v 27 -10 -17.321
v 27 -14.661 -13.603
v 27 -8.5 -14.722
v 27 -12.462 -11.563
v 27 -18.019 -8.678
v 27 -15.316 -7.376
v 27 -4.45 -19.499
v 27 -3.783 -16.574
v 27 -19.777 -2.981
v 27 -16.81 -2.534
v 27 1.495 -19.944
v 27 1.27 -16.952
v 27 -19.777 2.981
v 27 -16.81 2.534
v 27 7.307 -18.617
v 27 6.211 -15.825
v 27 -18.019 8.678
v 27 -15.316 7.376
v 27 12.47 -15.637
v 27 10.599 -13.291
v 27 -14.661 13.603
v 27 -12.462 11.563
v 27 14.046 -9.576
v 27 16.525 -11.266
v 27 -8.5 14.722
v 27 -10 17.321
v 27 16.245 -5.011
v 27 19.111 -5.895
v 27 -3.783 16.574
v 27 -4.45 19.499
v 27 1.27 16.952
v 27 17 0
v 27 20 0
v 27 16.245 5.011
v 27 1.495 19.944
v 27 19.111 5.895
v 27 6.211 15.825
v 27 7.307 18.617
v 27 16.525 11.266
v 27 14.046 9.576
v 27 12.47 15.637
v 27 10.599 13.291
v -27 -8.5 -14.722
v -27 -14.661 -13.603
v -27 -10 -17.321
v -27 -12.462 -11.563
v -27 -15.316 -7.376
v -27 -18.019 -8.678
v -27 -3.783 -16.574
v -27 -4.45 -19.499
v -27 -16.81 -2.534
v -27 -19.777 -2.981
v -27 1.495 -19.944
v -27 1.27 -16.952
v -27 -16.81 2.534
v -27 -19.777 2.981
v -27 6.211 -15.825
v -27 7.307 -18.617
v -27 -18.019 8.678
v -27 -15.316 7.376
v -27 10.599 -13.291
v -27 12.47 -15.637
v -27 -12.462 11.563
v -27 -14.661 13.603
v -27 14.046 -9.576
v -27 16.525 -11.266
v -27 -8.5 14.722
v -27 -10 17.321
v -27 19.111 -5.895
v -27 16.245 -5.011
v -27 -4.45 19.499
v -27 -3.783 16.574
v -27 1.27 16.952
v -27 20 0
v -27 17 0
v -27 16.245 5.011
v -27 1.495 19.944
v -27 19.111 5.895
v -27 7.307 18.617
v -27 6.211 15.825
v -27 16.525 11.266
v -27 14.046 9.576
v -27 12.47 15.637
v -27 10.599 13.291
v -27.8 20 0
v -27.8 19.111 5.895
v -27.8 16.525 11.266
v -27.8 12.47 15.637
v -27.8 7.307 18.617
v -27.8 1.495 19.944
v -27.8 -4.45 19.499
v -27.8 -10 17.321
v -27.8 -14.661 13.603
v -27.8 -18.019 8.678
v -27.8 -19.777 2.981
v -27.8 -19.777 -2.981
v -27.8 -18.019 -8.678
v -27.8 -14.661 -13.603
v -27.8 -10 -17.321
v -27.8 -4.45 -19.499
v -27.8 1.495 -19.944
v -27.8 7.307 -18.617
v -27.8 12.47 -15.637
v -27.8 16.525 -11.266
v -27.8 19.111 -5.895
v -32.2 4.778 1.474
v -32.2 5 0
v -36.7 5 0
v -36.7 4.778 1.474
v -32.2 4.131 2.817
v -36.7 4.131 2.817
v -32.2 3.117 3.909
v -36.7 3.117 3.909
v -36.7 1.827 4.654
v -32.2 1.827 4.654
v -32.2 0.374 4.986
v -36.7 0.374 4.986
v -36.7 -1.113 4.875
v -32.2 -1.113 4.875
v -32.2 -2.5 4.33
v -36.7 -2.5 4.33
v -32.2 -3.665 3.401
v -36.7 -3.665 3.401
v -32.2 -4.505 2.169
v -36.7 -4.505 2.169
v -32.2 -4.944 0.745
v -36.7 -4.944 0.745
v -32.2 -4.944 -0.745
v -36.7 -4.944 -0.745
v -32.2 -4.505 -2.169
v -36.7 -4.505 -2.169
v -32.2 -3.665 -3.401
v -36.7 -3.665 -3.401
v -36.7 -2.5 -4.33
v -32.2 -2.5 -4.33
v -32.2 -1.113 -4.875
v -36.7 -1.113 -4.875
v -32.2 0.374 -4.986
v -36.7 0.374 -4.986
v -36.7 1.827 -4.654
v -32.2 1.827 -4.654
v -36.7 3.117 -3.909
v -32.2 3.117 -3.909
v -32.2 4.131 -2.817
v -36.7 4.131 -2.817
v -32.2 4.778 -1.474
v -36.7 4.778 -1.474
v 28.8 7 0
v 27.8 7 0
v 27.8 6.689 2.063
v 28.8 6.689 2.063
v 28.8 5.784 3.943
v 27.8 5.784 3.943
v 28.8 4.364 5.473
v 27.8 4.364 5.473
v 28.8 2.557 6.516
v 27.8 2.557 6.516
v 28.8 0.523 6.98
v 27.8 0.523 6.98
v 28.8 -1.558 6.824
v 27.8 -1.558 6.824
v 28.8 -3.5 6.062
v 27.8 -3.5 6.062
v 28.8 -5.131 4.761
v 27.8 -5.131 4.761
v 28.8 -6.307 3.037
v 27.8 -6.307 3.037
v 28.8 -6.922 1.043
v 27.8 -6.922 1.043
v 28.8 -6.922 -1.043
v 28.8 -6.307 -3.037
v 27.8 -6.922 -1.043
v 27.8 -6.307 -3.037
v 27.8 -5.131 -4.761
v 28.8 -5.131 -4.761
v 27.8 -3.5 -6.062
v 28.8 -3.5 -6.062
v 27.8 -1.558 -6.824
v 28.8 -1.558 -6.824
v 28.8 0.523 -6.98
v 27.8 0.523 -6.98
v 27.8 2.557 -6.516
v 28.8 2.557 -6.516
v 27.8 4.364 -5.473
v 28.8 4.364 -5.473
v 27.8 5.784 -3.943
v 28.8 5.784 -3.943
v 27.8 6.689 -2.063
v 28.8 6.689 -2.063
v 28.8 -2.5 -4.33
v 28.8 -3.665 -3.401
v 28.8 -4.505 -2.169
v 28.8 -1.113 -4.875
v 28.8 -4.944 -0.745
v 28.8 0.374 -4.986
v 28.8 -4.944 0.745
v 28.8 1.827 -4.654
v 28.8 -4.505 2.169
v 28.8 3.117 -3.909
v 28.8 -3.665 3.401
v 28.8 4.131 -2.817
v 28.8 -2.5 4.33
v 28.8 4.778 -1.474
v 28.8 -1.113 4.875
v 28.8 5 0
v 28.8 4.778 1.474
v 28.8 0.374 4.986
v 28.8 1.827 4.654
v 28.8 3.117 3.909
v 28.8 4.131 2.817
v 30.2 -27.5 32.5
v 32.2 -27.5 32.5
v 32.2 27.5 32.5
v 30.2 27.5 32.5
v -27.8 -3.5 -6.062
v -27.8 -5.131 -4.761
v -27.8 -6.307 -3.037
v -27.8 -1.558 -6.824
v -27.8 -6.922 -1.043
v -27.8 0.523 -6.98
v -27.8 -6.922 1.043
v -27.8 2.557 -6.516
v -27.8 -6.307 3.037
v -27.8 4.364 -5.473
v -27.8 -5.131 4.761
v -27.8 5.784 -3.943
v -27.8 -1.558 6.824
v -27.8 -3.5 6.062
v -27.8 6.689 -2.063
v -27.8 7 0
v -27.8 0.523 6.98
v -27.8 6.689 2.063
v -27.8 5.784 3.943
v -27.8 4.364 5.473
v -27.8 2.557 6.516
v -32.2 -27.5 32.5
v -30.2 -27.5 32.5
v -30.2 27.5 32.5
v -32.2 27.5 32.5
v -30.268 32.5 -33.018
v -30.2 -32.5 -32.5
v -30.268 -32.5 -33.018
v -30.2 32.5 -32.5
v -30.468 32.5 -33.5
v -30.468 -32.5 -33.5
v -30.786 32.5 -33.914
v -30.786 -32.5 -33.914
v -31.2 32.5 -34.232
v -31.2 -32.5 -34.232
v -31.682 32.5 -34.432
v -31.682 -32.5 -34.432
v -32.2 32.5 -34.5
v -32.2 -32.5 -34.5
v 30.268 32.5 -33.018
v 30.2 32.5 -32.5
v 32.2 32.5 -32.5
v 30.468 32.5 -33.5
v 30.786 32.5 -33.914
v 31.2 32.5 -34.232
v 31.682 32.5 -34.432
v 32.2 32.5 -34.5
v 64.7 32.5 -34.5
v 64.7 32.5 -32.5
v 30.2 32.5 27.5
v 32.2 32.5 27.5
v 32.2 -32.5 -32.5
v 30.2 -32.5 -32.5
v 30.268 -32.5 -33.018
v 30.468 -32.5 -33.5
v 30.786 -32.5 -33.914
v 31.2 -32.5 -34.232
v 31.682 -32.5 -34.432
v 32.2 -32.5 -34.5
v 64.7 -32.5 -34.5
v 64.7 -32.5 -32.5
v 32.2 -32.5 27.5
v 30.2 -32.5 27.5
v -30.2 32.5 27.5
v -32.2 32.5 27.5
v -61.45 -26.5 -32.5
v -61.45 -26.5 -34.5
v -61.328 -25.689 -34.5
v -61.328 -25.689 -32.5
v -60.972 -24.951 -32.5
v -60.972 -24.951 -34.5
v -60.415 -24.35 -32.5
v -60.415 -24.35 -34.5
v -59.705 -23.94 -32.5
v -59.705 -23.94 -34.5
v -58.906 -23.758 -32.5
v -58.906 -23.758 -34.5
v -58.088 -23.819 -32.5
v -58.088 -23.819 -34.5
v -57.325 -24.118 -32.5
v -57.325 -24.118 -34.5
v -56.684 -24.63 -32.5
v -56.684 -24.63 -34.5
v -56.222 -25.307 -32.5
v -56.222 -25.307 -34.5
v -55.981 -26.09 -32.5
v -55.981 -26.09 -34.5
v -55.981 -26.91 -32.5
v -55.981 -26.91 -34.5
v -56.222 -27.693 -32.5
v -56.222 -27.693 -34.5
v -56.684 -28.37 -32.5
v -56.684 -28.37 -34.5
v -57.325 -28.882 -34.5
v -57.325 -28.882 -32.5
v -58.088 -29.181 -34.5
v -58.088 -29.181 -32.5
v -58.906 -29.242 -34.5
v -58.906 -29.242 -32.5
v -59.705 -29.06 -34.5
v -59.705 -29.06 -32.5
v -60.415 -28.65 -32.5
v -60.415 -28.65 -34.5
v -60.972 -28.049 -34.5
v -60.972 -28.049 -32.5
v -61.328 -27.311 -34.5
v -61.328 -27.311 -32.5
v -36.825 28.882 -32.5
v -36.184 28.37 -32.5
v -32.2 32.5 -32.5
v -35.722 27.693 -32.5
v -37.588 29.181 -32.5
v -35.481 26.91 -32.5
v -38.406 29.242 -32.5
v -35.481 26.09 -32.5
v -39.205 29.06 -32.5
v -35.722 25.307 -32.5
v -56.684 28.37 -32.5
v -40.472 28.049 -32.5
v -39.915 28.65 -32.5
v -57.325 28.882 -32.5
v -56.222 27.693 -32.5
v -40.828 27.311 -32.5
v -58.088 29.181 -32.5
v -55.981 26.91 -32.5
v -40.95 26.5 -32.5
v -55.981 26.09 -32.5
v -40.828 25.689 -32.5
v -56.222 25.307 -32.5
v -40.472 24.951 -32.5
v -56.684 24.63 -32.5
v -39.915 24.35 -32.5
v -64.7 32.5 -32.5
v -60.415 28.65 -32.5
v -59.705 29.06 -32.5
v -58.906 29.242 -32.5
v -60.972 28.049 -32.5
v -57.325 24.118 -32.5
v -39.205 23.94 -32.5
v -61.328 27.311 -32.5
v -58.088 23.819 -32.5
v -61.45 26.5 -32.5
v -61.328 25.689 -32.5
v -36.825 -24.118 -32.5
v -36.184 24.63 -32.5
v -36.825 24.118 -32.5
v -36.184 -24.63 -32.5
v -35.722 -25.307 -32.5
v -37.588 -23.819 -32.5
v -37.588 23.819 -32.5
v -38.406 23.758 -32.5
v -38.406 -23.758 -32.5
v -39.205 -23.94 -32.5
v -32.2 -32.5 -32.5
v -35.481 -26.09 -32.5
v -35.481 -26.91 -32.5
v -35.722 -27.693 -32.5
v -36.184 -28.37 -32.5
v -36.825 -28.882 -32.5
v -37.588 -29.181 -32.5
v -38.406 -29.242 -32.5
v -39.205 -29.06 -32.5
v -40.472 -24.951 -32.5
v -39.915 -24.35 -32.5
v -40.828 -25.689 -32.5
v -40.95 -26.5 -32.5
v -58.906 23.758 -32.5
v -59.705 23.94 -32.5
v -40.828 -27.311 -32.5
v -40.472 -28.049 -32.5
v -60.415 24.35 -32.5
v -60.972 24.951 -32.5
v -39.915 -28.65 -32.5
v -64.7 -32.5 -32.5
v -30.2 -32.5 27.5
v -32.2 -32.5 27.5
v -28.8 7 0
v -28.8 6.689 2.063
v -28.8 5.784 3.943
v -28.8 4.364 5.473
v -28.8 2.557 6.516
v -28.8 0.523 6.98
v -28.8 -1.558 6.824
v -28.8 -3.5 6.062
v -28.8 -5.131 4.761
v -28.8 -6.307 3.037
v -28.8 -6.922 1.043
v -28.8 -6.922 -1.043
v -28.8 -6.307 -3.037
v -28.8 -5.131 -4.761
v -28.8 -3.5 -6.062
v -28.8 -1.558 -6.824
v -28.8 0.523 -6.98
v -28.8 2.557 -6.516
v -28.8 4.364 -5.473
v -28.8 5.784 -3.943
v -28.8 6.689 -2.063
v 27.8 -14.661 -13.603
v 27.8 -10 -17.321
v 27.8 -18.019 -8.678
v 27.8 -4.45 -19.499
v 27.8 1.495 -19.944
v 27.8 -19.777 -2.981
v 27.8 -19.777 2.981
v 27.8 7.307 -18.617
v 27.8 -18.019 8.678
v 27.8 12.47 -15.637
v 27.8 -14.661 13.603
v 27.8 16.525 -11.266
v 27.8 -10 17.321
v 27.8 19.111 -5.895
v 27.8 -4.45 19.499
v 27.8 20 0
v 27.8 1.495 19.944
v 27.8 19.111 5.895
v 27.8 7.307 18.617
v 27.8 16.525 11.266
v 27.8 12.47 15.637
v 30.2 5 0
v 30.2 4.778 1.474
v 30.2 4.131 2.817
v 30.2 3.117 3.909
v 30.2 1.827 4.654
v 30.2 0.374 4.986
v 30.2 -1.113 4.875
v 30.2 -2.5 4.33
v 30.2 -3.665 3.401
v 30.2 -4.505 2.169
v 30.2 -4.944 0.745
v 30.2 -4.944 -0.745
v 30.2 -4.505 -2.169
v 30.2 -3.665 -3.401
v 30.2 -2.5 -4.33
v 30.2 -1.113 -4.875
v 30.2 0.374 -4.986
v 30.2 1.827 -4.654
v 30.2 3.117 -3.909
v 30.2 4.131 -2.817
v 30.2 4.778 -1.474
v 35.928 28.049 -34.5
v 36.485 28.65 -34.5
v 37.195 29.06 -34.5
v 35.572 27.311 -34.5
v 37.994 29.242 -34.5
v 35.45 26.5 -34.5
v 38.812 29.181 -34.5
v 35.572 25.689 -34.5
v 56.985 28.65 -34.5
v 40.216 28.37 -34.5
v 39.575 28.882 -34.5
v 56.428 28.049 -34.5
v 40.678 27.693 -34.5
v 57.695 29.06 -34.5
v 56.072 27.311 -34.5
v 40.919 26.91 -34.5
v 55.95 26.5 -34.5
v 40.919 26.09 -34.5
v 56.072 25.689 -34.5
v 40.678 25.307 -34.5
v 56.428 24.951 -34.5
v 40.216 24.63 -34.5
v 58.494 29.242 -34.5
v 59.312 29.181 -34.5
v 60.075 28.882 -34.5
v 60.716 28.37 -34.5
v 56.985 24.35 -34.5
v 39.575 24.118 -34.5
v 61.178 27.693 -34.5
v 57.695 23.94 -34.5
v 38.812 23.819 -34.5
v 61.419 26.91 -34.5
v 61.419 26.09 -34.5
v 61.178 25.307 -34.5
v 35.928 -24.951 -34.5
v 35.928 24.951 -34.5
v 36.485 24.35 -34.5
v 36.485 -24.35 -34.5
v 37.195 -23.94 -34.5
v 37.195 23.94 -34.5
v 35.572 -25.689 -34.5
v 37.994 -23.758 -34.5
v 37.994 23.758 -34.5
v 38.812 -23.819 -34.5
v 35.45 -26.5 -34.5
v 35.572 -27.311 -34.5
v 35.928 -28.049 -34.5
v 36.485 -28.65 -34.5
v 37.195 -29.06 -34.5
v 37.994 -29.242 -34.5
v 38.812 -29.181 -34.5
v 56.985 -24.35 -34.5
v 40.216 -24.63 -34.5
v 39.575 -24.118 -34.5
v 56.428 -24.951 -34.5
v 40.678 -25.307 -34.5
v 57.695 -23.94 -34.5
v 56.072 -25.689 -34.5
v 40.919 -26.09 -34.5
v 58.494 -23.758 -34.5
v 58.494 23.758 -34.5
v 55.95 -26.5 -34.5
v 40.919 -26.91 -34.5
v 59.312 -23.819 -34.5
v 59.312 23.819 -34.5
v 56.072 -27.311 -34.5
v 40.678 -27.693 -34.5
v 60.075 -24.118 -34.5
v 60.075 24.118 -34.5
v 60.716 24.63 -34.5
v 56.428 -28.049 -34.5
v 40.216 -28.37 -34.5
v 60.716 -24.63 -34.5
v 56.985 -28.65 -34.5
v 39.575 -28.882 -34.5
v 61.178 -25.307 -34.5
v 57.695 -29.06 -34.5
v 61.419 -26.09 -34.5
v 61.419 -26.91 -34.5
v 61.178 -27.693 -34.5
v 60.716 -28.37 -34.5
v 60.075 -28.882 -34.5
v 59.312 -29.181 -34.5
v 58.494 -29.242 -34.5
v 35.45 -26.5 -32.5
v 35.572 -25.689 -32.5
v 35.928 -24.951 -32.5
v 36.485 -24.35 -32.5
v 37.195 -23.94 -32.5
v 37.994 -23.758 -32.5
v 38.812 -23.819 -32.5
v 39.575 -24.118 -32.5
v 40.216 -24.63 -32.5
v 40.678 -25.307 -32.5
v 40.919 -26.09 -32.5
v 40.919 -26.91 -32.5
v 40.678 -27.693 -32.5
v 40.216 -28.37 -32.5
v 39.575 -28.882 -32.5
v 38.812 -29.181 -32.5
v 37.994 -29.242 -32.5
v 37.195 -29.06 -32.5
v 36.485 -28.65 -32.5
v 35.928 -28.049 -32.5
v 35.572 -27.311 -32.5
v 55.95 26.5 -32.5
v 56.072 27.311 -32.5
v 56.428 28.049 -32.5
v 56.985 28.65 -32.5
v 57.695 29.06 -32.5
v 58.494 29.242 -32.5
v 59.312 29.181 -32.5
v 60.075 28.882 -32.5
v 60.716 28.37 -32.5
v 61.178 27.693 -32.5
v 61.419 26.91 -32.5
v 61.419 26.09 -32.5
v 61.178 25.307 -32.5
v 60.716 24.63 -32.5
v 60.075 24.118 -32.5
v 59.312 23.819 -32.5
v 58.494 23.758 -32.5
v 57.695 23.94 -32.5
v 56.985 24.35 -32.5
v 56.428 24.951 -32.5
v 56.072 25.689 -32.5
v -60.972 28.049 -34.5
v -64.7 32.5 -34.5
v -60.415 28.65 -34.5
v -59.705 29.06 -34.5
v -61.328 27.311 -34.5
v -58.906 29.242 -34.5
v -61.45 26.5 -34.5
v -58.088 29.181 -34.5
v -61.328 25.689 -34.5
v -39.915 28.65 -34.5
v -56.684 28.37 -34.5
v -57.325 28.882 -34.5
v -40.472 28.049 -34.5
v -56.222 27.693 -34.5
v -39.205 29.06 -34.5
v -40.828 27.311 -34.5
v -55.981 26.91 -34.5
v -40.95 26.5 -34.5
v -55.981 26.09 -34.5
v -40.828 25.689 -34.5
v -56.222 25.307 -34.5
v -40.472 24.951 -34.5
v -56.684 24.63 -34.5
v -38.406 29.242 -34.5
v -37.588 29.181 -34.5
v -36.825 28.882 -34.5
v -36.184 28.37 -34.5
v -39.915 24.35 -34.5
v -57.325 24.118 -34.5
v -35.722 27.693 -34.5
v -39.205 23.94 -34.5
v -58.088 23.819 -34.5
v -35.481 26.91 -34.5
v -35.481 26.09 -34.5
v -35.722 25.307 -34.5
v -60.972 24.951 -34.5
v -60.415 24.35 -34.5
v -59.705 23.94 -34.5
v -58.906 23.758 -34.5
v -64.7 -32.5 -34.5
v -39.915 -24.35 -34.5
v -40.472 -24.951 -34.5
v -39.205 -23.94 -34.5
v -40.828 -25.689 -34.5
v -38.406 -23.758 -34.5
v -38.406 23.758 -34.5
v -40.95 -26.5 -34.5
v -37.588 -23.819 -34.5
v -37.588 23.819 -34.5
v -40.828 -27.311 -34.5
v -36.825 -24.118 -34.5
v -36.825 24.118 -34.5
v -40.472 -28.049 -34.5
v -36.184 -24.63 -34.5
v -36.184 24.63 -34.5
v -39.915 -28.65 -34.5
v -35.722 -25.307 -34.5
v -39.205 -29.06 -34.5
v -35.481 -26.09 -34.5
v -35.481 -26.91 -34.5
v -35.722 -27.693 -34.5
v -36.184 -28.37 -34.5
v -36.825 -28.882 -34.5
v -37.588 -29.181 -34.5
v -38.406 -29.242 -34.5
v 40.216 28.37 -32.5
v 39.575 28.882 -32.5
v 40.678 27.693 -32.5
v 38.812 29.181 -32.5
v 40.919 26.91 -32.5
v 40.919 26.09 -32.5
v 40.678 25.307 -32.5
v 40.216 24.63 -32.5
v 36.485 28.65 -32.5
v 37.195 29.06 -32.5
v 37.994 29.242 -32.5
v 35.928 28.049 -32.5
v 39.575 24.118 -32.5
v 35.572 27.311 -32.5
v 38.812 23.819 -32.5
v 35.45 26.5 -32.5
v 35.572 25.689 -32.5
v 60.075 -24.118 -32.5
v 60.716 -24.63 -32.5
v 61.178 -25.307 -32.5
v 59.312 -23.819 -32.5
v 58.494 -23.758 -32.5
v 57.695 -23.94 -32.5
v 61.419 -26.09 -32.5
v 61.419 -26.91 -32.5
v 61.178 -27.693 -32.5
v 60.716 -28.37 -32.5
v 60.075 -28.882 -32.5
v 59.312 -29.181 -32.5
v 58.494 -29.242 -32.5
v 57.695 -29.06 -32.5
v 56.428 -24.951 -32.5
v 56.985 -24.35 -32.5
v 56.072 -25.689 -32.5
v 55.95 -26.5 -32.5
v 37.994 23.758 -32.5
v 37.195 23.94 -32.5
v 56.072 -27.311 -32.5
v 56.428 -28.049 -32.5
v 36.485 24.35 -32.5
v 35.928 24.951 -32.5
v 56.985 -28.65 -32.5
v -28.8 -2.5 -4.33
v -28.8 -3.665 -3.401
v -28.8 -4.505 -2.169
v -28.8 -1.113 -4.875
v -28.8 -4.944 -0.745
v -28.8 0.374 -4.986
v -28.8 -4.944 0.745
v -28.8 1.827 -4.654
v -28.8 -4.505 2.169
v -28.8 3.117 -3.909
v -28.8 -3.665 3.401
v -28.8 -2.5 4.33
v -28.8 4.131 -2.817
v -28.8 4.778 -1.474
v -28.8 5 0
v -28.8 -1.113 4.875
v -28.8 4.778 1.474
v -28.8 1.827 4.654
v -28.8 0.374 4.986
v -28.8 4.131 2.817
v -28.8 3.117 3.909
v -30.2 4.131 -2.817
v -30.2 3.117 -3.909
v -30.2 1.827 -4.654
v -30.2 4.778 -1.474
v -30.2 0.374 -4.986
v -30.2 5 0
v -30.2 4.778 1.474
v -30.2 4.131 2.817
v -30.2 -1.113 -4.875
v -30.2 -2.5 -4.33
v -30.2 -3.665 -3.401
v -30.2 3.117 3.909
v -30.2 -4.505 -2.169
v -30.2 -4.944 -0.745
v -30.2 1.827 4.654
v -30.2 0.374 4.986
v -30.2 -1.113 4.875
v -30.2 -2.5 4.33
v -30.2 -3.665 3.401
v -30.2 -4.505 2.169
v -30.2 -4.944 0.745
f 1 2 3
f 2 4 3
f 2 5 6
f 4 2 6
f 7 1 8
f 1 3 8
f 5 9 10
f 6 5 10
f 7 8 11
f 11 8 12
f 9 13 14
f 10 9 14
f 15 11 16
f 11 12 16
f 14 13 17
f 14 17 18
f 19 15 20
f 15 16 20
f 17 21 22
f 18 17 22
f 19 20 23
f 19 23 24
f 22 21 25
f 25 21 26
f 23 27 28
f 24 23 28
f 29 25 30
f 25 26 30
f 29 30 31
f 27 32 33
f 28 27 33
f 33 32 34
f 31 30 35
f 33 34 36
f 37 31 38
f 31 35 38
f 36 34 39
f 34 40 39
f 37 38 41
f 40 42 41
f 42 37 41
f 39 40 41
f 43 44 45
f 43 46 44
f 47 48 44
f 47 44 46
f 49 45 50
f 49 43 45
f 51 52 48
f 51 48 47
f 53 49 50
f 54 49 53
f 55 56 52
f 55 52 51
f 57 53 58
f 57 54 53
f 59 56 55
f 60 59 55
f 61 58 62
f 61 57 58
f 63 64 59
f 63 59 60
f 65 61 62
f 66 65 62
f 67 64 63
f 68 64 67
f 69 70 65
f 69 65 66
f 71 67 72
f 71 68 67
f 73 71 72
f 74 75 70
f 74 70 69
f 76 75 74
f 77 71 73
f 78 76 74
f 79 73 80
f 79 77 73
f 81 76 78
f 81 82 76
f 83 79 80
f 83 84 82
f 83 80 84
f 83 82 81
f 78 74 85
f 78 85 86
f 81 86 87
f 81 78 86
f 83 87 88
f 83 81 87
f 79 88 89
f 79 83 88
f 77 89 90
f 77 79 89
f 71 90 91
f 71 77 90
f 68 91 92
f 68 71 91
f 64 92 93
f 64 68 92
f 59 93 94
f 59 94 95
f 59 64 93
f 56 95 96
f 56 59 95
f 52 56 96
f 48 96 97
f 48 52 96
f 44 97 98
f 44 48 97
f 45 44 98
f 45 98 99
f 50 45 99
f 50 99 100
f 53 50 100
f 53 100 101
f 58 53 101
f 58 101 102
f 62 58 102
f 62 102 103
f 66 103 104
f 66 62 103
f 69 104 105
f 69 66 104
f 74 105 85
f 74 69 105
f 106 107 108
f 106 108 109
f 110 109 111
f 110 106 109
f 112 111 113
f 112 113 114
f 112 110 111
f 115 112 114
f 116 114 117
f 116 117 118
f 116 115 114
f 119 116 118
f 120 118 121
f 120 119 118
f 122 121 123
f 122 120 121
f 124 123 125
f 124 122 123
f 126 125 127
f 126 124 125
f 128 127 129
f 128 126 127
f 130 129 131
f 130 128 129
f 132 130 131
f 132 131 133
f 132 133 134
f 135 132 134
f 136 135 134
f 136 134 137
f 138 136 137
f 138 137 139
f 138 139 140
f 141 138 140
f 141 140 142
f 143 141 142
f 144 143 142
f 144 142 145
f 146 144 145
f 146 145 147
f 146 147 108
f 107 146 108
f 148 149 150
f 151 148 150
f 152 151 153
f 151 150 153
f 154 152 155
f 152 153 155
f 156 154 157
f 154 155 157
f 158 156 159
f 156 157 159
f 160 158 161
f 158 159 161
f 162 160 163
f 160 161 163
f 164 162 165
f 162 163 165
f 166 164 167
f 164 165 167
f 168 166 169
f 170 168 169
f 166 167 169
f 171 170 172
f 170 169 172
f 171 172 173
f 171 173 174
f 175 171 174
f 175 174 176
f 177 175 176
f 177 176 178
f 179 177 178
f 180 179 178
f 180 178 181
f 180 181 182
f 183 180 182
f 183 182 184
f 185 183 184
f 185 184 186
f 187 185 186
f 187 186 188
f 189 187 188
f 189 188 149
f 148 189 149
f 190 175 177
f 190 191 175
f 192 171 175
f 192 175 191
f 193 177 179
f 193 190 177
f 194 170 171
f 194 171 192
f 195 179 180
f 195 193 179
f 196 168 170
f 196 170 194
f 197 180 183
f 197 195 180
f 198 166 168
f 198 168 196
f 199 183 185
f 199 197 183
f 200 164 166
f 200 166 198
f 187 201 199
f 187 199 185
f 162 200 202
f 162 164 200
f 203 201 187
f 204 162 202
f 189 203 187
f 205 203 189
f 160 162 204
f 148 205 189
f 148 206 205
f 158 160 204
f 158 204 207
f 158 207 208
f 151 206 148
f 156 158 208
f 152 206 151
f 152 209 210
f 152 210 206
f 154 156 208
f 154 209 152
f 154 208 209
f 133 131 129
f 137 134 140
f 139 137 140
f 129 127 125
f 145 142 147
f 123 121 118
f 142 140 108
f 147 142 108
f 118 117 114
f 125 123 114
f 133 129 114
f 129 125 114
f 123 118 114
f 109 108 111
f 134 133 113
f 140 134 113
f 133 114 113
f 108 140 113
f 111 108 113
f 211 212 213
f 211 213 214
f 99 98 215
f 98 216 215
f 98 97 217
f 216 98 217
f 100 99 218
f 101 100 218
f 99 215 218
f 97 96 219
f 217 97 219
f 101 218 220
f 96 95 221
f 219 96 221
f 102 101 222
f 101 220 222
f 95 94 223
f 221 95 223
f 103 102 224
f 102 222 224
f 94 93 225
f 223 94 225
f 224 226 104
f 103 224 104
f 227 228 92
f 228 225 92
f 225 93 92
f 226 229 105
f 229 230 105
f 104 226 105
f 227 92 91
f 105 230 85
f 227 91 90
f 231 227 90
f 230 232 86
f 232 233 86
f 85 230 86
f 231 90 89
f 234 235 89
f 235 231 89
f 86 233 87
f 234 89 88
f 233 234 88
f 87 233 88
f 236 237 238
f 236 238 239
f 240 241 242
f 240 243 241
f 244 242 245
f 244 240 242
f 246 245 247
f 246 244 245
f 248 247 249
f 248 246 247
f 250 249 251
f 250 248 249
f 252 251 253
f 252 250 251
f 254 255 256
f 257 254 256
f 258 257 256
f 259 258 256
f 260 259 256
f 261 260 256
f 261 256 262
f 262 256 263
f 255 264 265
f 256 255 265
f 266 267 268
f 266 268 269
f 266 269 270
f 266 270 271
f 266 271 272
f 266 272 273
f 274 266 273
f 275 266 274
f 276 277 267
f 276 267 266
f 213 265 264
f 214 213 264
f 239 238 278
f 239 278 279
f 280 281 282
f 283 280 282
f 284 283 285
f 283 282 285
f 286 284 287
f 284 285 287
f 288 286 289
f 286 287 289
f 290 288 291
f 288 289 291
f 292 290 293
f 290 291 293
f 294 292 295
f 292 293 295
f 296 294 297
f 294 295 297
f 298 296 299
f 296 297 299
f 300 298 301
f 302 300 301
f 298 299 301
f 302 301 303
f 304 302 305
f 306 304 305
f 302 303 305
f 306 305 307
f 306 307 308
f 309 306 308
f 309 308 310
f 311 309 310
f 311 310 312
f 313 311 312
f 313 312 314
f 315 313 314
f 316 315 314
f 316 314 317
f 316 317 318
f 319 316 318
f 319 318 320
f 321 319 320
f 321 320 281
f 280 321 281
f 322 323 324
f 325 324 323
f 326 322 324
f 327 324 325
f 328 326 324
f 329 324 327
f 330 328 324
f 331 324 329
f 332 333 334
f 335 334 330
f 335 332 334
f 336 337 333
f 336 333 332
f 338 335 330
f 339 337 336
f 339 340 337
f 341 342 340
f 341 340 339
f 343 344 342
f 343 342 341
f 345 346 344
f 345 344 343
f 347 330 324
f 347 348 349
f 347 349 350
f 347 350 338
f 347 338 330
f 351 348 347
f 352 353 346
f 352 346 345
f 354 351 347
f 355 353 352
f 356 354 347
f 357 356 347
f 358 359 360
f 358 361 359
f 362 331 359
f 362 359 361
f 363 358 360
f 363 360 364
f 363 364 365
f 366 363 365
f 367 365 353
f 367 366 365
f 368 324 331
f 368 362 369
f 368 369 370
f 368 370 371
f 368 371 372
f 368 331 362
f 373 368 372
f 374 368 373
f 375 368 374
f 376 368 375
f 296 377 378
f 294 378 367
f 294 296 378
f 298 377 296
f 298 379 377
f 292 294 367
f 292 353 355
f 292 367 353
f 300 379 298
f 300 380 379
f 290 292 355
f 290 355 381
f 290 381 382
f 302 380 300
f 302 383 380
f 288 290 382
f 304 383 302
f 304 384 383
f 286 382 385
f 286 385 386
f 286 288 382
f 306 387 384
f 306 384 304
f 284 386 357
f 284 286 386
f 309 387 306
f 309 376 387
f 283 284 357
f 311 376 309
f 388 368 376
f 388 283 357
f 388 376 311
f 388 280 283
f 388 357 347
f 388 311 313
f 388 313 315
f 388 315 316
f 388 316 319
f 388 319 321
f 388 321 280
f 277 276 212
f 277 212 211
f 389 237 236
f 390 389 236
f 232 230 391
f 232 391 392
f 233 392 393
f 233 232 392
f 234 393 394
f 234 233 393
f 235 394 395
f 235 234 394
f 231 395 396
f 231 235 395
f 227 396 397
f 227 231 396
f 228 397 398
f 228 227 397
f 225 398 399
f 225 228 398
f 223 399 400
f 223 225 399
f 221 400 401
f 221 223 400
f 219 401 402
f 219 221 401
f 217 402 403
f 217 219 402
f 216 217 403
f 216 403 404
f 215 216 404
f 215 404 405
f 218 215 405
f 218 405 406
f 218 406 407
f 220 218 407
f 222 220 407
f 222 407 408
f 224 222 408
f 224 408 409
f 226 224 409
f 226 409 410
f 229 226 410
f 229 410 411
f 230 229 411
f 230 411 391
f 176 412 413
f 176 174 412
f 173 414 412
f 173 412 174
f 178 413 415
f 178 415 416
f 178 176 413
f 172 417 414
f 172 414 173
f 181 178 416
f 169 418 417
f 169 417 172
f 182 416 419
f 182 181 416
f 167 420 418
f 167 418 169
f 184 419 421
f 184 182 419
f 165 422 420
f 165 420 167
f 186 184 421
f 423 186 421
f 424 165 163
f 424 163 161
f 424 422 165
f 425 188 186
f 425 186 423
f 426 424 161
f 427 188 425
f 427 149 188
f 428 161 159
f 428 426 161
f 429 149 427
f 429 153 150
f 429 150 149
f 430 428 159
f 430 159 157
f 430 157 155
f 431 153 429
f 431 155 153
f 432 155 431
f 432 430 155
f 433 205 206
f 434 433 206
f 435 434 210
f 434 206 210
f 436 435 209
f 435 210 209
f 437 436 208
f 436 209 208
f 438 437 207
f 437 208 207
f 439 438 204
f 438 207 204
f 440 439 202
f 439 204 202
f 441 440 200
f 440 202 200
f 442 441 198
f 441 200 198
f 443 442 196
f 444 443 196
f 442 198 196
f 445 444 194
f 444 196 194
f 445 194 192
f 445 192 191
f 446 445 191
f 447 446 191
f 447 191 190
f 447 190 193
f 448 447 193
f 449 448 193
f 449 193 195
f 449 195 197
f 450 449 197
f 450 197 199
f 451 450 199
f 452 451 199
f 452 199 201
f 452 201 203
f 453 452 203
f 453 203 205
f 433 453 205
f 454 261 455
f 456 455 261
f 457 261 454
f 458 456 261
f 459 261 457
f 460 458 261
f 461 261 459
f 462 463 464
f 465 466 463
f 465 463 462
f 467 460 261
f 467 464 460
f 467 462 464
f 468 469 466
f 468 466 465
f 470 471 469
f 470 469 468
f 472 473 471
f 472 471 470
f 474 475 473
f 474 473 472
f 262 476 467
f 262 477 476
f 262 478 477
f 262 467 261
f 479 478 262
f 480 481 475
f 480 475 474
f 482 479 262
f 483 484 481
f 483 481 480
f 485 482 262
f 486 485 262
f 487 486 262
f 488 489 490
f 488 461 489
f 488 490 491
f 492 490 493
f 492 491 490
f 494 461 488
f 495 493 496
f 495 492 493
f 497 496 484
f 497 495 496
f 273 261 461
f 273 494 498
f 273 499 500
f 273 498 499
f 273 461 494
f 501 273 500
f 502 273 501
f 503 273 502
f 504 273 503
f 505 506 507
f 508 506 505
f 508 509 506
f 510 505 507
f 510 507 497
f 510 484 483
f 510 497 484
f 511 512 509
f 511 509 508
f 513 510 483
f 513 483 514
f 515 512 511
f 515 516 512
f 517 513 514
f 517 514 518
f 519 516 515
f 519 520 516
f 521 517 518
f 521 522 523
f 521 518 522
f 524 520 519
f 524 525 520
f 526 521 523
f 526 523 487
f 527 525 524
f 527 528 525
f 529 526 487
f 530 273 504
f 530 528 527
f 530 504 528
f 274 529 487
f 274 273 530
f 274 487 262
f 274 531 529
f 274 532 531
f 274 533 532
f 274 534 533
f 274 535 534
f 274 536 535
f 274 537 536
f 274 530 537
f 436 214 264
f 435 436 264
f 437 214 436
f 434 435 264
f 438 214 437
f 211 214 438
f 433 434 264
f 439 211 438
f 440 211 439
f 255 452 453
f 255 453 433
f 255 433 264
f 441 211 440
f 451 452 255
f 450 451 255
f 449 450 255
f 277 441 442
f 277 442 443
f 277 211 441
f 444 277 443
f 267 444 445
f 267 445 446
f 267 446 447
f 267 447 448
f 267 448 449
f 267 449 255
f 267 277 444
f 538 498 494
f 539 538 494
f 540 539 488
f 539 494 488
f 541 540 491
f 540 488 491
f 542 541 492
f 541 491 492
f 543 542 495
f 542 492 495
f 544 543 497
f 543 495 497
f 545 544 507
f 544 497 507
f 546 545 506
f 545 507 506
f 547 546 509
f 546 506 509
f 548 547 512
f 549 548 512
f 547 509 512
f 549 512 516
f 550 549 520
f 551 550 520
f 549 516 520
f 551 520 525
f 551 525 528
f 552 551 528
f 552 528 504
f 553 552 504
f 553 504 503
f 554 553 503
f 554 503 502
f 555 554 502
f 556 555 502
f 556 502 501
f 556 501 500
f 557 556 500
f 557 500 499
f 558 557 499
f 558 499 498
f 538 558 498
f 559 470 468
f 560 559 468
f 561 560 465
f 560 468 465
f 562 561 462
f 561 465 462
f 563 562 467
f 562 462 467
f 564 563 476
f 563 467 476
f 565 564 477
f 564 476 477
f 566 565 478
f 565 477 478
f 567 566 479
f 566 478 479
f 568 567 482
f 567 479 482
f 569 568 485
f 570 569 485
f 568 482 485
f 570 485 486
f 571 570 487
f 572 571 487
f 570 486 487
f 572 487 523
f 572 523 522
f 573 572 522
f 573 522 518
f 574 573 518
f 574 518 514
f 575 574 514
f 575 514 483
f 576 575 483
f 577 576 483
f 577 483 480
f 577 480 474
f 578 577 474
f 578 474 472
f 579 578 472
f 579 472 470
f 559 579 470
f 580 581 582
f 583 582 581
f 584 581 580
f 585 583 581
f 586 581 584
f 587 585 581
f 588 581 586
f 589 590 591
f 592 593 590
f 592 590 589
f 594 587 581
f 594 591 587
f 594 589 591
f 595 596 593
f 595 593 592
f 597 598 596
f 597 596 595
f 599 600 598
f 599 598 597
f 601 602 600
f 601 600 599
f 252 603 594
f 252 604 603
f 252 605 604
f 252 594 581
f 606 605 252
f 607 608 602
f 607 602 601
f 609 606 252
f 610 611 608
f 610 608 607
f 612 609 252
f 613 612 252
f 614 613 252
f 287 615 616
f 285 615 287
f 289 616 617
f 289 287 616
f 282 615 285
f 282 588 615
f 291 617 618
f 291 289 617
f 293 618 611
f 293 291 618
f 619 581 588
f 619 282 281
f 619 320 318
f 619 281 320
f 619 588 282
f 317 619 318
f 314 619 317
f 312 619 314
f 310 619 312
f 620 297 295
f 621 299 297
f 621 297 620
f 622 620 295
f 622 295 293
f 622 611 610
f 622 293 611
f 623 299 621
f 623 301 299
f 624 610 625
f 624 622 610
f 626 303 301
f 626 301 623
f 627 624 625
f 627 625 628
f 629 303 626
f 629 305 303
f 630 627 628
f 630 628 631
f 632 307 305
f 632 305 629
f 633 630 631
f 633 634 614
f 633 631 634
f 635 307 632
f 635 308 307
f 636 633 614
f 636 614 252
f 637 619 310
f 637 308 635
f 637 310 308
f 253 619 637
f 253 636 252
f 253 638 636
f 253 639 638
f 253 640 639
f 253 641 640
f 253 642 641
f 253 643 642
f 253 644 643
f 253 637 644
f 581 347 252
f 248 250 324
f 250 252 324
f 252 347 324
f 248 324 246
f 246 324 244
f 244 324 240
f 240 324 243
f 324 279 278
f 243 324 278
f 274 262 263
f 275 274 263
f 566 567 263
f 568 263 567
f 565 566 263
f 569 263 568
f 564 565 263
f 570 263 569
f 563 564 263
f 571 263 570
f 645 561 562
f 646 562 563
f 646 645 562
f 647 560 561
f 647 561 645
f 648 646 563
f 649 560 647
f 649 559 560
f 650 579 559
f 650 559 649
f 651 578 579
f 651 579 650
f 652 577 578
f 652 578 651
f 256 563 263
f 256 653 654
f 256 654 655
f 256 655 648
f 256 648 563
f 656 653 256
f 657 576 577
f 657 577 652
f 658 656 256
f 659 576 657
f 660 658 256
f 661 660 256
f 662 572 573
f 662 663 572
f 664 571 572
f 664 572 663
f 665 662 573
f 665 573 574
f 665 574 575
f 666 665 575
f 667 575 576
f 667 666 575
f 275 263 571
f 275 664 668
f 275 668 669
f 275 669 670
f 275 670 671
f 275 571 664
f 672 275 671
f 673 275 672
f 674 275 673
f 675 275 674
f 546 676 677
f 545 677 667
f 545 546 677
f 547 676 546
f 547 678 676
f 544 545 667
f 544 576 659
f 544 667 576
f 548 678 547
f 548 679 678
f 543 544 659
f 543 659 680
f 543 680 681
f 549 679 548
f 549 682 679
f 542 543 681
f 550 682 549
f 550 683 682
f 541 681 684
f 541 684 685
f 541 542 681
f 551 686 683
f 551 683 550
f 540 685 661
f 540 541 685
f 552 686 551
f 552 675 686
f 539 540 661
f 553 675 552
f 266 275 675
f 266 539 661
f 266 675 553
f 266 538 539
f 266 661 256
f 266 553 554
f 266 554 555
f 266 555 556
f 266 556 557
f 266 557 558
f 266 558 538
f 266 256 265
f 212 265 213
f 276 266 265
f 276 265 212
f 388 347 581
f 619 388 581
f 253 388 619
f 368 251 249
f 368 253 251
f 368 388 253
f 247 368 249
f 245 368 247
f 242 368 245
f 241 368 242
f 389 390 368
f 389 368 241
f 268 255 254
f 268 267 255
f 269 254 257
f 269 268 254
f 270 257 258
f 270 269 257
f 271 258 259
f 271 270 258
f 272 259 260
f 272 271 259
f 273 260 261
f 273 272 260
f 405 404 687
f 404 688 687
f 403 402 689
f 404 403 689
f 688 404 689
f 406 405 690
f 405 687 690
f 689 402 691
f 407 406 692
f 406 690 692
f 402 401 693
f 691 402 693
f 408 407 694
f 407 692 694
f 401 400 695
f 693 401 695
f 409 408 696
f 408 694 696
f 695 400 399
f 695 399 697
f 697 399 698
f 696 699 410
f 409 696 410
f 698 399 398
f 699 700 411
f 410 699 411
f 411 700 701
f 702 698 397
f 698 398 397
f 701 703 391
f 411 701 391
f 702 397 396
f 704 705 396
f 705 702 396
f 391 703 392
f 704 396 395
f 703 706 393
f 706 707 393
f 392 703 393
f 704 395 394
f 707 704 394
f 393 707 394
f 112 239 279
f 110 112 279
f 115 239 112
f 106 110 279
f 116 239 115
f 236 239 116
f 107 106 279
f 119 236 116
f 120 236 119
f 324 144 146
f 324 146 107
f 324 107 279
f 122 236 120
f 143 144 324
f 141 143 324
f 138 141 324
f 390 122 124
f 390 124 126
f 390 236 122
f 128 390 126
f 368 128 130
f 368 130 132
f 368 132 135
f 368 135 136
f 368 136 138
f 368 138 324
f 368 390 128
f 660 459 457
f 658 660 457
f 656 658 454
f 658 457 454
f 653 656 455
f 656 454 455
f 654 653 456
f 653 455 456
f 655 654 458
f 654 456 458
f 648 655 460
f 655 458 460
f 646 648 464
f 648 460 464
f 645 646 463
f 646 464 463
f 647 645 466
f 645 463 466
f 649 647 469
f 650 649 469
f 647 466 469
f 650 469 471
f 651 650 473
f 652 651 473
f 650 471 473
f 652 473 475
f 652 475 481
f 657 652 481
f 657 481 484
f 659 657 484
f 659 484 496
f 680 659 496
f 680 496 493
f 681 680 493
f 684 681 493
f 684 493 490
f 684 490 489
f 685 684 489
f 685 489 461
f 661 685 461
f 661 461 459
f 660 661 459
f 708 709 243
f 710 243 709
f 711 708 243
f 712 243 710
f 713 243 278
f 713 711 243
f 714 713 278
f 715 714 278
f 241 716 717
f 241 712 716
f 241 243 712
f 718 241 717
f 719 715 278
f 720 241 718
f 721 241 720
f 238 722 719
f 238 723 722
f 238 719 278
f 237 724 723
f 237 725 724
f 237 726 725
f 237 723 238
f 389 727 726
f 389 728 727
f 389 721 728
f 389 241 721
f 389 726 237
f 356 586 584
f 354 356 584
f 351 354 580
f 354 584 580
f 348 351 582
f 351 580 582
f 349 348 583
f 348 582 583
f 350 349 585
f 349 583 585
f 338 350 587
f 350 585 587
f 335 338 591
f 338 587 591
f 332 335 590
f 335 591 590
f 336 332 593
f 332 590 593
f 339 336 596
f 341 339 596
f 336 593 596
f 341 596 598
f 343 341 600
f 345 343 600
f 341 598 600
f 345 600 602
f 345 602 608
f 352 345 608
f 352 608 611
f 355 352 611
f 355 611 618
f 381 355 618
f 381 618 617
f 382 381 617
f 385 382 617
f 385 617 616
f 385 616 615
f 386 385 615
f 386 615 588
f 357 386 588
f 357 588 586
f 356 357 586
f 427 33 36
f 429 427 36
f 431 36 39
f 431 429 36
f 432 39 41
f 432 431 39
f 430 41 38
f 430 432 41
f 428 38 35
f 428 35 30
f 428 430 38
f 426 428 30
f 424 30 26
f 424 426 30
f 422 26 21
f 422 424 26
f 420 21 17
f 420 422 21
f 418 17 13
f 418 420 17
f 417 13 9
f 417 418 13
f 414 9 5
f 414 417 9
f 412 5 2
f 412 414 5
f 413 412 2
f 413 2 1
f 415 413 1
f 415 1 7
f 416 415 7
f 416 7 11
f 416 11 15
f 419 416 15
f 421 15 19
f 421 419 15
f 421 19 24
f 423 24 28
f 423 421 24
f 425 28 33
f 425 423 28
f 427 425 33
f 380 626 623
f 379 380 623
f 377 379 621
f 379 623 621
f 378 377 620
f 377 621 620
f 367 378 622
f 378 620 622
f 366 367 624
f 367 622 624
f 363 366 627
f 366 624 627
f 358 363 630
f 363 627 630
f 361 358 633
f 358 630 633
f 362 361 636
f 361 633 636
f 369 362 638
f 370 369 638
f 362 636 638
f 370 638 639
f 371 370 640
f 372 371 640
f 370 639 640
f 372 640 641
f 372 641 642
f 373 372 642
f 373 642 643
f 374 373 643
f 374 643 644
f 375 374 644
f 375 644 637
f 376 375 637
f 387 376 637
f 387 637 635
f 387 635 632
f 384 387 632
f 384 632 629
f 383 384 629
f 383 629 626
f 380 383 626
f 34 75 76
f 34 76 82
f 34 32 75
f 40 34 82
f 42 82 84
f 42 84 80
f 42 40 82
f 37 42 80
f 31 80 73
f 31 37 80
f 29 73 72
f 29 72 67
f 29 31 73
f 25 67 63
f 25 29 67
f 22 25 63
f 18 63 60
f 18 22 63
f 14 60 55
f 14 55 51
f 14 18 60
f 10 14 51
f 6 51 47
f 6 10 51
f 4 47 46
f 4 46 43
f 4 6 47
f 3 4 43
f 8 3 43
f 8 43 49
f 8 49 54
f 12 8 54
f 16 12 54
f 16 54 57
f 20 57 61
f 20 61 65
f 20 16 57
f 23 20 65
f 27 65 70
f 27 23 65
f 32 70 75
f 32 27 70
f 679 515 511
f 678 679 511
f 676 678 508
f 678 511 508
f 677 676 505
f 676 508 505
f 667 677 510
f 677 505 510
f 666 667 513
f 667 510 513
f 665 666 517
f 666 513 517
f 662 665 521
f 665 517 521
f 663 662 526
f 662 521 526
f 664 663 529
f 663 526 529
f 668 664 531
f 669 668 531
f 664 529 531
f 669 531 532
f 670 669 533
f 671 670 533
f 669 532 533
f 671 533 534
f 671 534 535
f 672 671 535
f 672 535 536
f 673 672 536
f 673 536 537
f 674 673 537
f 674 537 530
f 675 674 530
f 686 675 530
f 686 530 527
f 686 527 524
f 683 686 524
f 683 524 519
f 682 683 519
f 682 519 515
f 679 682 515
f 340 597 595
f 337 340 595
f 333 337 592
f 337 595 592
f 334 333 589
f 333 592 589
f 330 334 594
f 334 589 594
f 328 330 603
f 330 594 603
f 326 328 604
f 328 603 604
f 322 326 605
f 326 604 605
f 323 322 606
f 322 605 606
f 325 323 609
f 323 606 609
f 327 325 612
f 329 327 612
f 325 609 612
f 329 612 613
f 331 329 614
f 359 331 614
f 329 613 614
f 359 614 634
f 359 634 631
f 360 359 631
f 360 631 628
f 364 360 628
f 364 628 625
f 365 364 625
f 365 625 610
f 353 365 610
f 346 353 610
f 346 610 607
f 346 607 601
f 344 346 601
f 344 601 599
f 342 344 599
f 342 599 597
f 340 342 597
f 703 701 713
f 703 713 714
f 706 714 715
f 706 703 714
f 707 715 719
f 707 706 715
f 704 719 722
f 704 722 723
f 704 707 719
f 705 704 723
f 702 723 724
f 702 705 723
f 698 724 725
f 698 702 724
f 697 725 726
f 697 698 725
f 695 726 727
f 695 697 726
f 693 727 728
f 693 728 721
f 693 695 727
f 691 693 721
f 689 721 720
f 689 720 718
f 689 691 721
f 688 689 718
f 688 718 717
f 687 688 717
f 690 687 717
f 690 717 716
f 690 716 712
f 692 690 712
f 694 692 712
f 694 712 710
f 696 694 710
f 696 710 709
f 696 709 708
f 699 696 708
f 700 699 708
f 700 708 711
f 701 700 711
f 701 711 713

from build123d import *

# Parameters (mm, degrees)
F0_R          = 20
F1_DEPTH      = 27.8
F1_DEPTH_BACK = 27.8
F2_R          = 7
F3_DEPTH      = 28.8
F3_DEPTH_BACK = 28.8
F4_R          = 20
F4_R_2        = 17
F5_DEPTH      = 27
F5_DEPTH_BACK = 27
F6_R          = 5
F7_DEPTH      = 32.2
F7_DEPTH_BACK = 36.7
F9_DEPTH      = 32.5
F9_DEPTH_BACK = 32.5
F10_SIZE      = 5
F11_R         = 2
F13_D         = 5.5


with BuildPart() as f1:
    # F0 (on Right) → F1 (new body, two sides)
    with BuildSketch(Plane.YZ) as f1_sk:
        Circle(F0_R)
    extrude(amount=F1_DEPTH)
    extrude(f1_sk.sketch, amount=-F1_DEPTH_BACK)

    # F2 (on Right) → F3 (join, two sides)
    with BuildSketch(Plane.YZ) as f3_sk:
        Circle(F2_R)
    extrude(amount=F3_DEPTH)
    extrude(f3_sk.sketch, amount=-F3_DEPTH_BACK)

    # F4 (on Right) → F5 (cut, two sides)
    with BuildSketch(Plane.YZ) as f5_sk:
        Circle(F4_R)
        Circle(F4_R_2, mode=Mode.SUBTRACT)
    extrude(amount=-F5_DEPTH, mode=Mode.SUBTRACT)
    extrude(f5_sk.sketch, amount=F5_DEPTH_BACK, mode=Mode.SUBTRACT)

    # F6 (on Right) → F7 (join, two sides)
    with BuildSketch(Plane.YZ) as f7_sk:
        Circle(F6_R)
    extrude(amount=F7_DEPTH)
    extrude(f7_sk.sketch, amount=-F7_DEPTH_BACK)

    # F8 (on Front) → F9 (join, two sides)
    with BuildSketch(Plane.XZ) as f9_sk:
        Polygon((32.2, 32.5), (30.2, 32.5), (30.2, -34.5), (64.7, -34.5), (64.7, -32.5), (32.2, -32.5), align=None)
        Polygon((-30.2, -34.5), (-30.2, 32.5), (-32.2, 32.5), (-32.2, -32.5), (-64.7, -32.5), (-64.7, -34.5), align=None)
    extrude(amount=F9_DEPTH)
    extrude(f9_sk.sketch, amount=-F9_DEPTH_BACK)

    # F10
    f10_edges = [f1.edges().sort_by_distance(p)[0] for p in [
        (31.2, -32.5, 32.5),
        (31.2, 32.5, 32.5),
        (-31.2, -32.5, 32.5),
        (-31.2, 32.5, 32.5),
    ]]
    chamfer(f10_edges, length=F10_SIZE)

    # F11
    f11_edges = [f1.edges().sort_by_distance(p)[0] for p in [
        (30.2, 0, -34.5),
        (-30.2, 0, -34.5),
    ]]
    fillet(f11_edges, radius=F11_R)

    # F13 (through all)
    with Locations(Plane.XY.offset(-32.5)):
        with Locations((38.2, 26.5), (38.2, -26.5), (58.7, -26.5), (-38.2, -26.5), (-58.7, -26.5), (-58.7, 26.5), (-38.2, 26.5), (58.7, 26.5)):
            Hole(F13_D / 2)


solid = f1.part
